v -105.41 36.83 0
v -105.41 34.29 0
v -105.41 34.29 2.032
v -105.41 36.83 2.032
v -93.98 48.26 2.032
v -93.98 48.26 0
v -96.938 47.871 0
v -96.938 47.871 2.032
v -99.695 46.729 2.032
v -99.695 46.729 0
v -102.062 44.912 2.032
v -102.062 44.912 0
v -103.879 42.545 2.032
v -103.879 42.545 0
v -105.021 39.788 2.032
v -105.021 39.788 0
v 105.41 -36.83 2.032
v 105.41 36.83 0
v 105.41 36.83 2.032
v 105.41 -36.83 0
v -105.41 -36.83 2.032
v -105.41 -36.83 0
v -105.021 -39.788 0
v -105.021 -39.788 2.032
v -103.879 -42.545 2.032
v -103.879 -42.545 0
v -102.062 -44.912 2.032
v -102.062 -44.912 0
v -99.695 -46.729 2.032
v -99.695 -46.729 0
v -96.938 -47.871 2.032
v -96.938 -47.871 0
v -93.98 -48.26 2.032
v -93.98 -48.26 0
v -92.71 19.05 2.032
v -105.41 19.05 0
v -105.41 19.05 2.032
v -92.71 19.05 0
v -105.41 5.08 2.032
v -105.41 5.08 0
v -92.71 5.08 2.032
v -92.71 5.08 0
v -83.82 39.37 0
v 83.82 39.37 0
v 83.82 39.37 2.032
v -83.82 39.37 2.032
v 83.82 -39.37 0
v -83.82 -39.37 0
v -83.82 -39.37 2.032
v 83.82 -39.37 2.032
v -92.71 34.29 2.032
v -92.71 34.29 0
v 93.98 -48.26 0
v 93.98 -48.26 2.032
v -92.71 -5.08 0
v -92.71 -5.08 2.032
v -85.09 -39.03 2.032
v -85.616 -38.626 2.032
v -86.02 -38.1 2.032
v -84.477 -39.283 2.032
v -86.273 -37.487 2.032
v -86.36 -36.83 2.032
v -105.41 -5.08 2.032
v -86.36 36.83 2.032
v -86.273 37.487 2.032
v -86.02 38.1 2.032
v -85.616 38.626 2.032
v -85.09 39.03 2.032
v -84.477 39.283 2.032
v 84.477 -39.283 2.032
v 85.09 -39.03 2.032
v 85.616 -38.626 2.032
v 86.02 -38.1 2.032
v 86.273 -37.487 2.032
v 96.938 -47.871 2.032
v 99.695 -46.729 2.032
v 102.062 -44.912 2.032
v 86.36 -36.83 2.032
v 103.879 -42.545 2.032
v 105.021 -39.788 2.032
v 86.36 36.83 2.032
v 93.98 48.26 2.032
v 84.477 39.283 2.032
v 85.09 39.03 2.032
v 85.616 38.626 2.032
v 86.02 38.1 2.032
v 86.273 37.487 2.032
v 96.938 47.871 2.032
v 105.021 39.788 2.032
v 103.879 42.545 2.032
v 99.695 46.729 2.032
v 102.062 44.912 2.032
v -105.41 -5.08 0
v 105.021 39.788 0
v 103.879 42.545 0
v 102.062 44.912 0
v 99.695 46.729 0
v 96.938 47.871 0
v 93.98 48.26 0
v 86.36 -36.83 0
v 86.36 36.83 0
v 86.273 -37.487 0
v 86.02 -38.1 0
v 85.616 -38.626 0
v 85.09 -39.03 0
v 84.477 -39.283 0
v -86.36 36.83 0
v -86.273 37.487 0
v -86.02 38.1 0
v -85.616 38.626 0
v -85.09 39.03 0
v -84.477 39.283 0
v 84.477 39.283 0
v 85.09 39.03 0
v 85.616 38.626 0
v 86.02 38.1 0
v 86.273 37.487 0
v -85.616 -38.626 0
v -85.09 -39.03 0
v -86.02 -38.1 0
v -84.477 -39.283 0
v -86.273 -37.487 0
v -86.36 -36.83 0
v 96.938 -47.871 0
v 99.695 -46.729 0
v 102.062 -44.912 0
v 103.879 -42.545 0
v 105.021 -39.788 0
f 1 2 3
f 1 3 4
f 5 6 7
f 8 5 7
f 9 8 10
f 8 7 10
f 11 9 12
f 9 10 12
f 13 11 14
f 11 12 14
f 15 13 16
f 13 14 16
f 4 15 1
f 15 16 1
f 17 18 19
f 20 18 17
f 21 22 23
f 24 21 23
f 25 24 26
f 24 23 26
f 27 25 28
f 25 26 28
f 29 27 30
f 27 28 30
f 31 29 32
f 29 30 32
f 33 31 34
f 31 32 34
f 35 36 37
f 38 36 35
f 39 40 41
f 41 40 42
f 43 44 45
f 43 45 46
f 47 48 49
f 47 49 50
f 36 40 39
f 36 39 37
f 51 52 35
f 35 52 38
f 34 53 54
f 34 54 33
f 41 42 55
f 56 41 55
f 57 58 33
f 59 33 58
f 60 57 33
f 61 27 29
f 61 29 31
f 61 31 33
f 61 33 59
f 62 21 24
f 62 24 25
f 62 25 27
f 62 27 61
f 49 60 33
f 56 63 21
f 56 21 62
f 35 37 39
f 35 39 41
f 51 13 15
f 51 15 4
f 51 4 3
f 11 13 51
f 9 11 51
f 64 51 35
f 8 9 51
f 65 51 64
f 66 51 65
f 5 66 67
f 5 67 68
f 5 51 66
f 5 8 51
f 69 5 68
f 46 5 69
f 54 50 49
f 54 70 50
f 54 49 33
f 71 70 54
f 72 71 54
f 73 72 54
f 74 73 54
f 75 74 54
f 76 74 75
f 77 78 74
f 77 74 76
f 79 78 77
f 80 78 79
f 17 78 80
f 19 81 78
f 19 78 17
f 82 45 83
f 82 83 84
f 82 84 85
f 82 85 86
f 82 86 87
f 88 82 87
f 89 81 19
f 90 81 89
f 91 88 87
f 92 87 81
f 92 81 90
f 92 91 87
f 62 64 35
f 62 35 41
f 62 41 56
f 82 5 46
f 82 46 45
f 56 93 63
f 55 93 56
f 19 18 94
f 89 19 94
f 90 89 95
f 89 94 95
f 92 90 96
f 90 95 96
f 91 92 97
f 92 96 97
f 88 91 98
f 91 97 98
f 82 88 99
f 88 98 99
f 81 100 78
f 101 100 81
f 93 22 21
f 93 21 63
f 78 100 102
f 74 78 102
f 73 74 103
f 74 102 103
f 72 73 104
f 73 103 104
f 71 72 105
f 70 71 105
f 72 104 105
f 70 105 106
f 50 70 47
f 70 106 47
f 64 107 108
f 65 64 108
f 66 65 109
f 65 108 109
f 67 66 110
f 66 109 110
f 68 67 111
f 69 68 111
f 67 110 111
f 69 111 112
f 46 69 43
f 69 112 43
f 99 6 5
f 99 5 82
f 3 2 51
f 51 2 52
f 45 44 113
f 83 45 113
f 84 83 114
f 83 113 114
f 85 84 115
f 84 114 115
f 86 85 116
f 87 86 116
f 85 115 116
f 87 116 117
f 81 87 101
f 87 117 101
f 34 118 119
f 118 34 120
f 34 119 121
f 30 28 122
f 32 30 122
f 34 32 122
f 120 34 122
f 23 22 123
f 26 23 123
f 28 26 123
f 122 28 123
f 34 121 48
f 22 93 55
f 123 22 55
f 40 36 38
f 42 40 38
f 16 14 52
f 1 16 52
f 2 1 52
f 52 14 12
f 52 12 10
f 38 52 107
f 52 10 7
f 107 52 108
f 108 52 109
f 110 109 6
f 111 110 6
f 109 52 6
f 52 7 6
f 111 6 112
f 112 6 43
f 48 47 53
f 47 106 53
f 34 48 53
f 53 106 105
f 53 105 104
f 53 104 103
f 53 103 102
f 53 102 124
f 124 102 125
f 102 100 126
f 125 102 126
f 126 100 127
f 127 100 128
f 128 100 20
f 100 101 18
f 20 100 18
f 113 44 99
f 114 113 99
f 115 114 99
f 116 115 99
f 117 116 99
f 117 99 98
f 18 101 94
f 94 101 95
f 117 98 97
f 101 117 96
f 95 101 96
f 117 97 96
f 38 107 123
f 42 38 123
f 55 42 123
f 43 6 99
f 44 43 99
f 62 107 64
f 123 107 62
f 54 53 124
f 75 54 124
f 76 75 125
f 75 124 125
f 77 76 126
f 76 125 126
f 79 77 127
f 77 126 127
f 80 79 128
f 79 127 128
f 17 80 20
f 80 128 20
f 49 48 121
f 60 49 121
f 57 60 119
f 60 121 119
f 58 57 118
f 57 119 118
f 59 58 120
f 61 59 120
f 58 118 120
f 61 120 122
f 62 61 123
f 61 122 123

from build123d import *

# Parameters (mm, degrees)
PAD_DEPTH     = 2.032
SKETCH002_W   = 12.7
SKETCH002_H   = 10.16
SKETCH002_H_2 = 15.24
POCKET_DEPTH  = 5.0038


with BuildPart() as part:
    # Sketch → Pad (new body)
    with BuildSketch(Plane.XY):
        with BuildLine():
            ThreePointArc((-93.98, 48.26), (-102.062231, 44.912231), (-105.41, 36.83))
            Line((-105.41, -36.83), (-105.41, 36.83))
            ThreePointArc((-105.41, -36.83), (-102.062231, -44.912231), (-93.98, -48.26))
            Line((93.98, -48.26), (-93.98, -48.26))
            ThreePointArc((93.98, -48.26), (102.062231, -44.912231), (105.41, -36.83))
            Line((105.41, 36.83), (105.41, -36.83))
            ThreePointArc((105.41, 36.83), (102.062231, 44.912231), (93.98, 48.26))
            Line((-93.98, 48.26), (93.98, 48.26))
        make_face()
    extrude(amount=PAD_DEPTH)

    # Sketch002 (on Face9 of Pad) → Pocket (cut)
    with BuildSketch(Plane(origin=(0, 0, 0), x_dir=(1, 0, 0), z_dir=(0, 0, -1))):
        with BuildLine():
            ThreePointArc((-83.82, 39.37), (-85.616051, 38.626051), (-86.36, 36.83))
            Line((-86.36, -36.83), (-86.36, 36.83))
            ThreePointArc((-86.36, -36.83), (-85.616051, -38.626051), (-83.82, -39.37))
            Line((83.82, -39.37), (-83.82, -39.37))
            ThreePointArc((83.82, -39.37), (85.616051, -38.626051), (86.36, -36.83))
            Line((86.36, 36.83), (86.36, -36.83))
            ThreePointArc((86.36, 36.83), (85.616051, 38.626051), (83.82, 39.37))
            Line((-83.82, 39.37), (83.82, 39.37))
        make_face()
        with Locations((-99.06, 0)):
            Rectangle(SKETCH002_W, SKETCH002_H)
        with Locations((-99.06, -26.67)):
            Rectangle(SKETCH002_W, SKETCH002_H_2)
    extrude(amount=-POCKET_DEPTH, mode=Mode.SUBTRACT)


solid = part.part
